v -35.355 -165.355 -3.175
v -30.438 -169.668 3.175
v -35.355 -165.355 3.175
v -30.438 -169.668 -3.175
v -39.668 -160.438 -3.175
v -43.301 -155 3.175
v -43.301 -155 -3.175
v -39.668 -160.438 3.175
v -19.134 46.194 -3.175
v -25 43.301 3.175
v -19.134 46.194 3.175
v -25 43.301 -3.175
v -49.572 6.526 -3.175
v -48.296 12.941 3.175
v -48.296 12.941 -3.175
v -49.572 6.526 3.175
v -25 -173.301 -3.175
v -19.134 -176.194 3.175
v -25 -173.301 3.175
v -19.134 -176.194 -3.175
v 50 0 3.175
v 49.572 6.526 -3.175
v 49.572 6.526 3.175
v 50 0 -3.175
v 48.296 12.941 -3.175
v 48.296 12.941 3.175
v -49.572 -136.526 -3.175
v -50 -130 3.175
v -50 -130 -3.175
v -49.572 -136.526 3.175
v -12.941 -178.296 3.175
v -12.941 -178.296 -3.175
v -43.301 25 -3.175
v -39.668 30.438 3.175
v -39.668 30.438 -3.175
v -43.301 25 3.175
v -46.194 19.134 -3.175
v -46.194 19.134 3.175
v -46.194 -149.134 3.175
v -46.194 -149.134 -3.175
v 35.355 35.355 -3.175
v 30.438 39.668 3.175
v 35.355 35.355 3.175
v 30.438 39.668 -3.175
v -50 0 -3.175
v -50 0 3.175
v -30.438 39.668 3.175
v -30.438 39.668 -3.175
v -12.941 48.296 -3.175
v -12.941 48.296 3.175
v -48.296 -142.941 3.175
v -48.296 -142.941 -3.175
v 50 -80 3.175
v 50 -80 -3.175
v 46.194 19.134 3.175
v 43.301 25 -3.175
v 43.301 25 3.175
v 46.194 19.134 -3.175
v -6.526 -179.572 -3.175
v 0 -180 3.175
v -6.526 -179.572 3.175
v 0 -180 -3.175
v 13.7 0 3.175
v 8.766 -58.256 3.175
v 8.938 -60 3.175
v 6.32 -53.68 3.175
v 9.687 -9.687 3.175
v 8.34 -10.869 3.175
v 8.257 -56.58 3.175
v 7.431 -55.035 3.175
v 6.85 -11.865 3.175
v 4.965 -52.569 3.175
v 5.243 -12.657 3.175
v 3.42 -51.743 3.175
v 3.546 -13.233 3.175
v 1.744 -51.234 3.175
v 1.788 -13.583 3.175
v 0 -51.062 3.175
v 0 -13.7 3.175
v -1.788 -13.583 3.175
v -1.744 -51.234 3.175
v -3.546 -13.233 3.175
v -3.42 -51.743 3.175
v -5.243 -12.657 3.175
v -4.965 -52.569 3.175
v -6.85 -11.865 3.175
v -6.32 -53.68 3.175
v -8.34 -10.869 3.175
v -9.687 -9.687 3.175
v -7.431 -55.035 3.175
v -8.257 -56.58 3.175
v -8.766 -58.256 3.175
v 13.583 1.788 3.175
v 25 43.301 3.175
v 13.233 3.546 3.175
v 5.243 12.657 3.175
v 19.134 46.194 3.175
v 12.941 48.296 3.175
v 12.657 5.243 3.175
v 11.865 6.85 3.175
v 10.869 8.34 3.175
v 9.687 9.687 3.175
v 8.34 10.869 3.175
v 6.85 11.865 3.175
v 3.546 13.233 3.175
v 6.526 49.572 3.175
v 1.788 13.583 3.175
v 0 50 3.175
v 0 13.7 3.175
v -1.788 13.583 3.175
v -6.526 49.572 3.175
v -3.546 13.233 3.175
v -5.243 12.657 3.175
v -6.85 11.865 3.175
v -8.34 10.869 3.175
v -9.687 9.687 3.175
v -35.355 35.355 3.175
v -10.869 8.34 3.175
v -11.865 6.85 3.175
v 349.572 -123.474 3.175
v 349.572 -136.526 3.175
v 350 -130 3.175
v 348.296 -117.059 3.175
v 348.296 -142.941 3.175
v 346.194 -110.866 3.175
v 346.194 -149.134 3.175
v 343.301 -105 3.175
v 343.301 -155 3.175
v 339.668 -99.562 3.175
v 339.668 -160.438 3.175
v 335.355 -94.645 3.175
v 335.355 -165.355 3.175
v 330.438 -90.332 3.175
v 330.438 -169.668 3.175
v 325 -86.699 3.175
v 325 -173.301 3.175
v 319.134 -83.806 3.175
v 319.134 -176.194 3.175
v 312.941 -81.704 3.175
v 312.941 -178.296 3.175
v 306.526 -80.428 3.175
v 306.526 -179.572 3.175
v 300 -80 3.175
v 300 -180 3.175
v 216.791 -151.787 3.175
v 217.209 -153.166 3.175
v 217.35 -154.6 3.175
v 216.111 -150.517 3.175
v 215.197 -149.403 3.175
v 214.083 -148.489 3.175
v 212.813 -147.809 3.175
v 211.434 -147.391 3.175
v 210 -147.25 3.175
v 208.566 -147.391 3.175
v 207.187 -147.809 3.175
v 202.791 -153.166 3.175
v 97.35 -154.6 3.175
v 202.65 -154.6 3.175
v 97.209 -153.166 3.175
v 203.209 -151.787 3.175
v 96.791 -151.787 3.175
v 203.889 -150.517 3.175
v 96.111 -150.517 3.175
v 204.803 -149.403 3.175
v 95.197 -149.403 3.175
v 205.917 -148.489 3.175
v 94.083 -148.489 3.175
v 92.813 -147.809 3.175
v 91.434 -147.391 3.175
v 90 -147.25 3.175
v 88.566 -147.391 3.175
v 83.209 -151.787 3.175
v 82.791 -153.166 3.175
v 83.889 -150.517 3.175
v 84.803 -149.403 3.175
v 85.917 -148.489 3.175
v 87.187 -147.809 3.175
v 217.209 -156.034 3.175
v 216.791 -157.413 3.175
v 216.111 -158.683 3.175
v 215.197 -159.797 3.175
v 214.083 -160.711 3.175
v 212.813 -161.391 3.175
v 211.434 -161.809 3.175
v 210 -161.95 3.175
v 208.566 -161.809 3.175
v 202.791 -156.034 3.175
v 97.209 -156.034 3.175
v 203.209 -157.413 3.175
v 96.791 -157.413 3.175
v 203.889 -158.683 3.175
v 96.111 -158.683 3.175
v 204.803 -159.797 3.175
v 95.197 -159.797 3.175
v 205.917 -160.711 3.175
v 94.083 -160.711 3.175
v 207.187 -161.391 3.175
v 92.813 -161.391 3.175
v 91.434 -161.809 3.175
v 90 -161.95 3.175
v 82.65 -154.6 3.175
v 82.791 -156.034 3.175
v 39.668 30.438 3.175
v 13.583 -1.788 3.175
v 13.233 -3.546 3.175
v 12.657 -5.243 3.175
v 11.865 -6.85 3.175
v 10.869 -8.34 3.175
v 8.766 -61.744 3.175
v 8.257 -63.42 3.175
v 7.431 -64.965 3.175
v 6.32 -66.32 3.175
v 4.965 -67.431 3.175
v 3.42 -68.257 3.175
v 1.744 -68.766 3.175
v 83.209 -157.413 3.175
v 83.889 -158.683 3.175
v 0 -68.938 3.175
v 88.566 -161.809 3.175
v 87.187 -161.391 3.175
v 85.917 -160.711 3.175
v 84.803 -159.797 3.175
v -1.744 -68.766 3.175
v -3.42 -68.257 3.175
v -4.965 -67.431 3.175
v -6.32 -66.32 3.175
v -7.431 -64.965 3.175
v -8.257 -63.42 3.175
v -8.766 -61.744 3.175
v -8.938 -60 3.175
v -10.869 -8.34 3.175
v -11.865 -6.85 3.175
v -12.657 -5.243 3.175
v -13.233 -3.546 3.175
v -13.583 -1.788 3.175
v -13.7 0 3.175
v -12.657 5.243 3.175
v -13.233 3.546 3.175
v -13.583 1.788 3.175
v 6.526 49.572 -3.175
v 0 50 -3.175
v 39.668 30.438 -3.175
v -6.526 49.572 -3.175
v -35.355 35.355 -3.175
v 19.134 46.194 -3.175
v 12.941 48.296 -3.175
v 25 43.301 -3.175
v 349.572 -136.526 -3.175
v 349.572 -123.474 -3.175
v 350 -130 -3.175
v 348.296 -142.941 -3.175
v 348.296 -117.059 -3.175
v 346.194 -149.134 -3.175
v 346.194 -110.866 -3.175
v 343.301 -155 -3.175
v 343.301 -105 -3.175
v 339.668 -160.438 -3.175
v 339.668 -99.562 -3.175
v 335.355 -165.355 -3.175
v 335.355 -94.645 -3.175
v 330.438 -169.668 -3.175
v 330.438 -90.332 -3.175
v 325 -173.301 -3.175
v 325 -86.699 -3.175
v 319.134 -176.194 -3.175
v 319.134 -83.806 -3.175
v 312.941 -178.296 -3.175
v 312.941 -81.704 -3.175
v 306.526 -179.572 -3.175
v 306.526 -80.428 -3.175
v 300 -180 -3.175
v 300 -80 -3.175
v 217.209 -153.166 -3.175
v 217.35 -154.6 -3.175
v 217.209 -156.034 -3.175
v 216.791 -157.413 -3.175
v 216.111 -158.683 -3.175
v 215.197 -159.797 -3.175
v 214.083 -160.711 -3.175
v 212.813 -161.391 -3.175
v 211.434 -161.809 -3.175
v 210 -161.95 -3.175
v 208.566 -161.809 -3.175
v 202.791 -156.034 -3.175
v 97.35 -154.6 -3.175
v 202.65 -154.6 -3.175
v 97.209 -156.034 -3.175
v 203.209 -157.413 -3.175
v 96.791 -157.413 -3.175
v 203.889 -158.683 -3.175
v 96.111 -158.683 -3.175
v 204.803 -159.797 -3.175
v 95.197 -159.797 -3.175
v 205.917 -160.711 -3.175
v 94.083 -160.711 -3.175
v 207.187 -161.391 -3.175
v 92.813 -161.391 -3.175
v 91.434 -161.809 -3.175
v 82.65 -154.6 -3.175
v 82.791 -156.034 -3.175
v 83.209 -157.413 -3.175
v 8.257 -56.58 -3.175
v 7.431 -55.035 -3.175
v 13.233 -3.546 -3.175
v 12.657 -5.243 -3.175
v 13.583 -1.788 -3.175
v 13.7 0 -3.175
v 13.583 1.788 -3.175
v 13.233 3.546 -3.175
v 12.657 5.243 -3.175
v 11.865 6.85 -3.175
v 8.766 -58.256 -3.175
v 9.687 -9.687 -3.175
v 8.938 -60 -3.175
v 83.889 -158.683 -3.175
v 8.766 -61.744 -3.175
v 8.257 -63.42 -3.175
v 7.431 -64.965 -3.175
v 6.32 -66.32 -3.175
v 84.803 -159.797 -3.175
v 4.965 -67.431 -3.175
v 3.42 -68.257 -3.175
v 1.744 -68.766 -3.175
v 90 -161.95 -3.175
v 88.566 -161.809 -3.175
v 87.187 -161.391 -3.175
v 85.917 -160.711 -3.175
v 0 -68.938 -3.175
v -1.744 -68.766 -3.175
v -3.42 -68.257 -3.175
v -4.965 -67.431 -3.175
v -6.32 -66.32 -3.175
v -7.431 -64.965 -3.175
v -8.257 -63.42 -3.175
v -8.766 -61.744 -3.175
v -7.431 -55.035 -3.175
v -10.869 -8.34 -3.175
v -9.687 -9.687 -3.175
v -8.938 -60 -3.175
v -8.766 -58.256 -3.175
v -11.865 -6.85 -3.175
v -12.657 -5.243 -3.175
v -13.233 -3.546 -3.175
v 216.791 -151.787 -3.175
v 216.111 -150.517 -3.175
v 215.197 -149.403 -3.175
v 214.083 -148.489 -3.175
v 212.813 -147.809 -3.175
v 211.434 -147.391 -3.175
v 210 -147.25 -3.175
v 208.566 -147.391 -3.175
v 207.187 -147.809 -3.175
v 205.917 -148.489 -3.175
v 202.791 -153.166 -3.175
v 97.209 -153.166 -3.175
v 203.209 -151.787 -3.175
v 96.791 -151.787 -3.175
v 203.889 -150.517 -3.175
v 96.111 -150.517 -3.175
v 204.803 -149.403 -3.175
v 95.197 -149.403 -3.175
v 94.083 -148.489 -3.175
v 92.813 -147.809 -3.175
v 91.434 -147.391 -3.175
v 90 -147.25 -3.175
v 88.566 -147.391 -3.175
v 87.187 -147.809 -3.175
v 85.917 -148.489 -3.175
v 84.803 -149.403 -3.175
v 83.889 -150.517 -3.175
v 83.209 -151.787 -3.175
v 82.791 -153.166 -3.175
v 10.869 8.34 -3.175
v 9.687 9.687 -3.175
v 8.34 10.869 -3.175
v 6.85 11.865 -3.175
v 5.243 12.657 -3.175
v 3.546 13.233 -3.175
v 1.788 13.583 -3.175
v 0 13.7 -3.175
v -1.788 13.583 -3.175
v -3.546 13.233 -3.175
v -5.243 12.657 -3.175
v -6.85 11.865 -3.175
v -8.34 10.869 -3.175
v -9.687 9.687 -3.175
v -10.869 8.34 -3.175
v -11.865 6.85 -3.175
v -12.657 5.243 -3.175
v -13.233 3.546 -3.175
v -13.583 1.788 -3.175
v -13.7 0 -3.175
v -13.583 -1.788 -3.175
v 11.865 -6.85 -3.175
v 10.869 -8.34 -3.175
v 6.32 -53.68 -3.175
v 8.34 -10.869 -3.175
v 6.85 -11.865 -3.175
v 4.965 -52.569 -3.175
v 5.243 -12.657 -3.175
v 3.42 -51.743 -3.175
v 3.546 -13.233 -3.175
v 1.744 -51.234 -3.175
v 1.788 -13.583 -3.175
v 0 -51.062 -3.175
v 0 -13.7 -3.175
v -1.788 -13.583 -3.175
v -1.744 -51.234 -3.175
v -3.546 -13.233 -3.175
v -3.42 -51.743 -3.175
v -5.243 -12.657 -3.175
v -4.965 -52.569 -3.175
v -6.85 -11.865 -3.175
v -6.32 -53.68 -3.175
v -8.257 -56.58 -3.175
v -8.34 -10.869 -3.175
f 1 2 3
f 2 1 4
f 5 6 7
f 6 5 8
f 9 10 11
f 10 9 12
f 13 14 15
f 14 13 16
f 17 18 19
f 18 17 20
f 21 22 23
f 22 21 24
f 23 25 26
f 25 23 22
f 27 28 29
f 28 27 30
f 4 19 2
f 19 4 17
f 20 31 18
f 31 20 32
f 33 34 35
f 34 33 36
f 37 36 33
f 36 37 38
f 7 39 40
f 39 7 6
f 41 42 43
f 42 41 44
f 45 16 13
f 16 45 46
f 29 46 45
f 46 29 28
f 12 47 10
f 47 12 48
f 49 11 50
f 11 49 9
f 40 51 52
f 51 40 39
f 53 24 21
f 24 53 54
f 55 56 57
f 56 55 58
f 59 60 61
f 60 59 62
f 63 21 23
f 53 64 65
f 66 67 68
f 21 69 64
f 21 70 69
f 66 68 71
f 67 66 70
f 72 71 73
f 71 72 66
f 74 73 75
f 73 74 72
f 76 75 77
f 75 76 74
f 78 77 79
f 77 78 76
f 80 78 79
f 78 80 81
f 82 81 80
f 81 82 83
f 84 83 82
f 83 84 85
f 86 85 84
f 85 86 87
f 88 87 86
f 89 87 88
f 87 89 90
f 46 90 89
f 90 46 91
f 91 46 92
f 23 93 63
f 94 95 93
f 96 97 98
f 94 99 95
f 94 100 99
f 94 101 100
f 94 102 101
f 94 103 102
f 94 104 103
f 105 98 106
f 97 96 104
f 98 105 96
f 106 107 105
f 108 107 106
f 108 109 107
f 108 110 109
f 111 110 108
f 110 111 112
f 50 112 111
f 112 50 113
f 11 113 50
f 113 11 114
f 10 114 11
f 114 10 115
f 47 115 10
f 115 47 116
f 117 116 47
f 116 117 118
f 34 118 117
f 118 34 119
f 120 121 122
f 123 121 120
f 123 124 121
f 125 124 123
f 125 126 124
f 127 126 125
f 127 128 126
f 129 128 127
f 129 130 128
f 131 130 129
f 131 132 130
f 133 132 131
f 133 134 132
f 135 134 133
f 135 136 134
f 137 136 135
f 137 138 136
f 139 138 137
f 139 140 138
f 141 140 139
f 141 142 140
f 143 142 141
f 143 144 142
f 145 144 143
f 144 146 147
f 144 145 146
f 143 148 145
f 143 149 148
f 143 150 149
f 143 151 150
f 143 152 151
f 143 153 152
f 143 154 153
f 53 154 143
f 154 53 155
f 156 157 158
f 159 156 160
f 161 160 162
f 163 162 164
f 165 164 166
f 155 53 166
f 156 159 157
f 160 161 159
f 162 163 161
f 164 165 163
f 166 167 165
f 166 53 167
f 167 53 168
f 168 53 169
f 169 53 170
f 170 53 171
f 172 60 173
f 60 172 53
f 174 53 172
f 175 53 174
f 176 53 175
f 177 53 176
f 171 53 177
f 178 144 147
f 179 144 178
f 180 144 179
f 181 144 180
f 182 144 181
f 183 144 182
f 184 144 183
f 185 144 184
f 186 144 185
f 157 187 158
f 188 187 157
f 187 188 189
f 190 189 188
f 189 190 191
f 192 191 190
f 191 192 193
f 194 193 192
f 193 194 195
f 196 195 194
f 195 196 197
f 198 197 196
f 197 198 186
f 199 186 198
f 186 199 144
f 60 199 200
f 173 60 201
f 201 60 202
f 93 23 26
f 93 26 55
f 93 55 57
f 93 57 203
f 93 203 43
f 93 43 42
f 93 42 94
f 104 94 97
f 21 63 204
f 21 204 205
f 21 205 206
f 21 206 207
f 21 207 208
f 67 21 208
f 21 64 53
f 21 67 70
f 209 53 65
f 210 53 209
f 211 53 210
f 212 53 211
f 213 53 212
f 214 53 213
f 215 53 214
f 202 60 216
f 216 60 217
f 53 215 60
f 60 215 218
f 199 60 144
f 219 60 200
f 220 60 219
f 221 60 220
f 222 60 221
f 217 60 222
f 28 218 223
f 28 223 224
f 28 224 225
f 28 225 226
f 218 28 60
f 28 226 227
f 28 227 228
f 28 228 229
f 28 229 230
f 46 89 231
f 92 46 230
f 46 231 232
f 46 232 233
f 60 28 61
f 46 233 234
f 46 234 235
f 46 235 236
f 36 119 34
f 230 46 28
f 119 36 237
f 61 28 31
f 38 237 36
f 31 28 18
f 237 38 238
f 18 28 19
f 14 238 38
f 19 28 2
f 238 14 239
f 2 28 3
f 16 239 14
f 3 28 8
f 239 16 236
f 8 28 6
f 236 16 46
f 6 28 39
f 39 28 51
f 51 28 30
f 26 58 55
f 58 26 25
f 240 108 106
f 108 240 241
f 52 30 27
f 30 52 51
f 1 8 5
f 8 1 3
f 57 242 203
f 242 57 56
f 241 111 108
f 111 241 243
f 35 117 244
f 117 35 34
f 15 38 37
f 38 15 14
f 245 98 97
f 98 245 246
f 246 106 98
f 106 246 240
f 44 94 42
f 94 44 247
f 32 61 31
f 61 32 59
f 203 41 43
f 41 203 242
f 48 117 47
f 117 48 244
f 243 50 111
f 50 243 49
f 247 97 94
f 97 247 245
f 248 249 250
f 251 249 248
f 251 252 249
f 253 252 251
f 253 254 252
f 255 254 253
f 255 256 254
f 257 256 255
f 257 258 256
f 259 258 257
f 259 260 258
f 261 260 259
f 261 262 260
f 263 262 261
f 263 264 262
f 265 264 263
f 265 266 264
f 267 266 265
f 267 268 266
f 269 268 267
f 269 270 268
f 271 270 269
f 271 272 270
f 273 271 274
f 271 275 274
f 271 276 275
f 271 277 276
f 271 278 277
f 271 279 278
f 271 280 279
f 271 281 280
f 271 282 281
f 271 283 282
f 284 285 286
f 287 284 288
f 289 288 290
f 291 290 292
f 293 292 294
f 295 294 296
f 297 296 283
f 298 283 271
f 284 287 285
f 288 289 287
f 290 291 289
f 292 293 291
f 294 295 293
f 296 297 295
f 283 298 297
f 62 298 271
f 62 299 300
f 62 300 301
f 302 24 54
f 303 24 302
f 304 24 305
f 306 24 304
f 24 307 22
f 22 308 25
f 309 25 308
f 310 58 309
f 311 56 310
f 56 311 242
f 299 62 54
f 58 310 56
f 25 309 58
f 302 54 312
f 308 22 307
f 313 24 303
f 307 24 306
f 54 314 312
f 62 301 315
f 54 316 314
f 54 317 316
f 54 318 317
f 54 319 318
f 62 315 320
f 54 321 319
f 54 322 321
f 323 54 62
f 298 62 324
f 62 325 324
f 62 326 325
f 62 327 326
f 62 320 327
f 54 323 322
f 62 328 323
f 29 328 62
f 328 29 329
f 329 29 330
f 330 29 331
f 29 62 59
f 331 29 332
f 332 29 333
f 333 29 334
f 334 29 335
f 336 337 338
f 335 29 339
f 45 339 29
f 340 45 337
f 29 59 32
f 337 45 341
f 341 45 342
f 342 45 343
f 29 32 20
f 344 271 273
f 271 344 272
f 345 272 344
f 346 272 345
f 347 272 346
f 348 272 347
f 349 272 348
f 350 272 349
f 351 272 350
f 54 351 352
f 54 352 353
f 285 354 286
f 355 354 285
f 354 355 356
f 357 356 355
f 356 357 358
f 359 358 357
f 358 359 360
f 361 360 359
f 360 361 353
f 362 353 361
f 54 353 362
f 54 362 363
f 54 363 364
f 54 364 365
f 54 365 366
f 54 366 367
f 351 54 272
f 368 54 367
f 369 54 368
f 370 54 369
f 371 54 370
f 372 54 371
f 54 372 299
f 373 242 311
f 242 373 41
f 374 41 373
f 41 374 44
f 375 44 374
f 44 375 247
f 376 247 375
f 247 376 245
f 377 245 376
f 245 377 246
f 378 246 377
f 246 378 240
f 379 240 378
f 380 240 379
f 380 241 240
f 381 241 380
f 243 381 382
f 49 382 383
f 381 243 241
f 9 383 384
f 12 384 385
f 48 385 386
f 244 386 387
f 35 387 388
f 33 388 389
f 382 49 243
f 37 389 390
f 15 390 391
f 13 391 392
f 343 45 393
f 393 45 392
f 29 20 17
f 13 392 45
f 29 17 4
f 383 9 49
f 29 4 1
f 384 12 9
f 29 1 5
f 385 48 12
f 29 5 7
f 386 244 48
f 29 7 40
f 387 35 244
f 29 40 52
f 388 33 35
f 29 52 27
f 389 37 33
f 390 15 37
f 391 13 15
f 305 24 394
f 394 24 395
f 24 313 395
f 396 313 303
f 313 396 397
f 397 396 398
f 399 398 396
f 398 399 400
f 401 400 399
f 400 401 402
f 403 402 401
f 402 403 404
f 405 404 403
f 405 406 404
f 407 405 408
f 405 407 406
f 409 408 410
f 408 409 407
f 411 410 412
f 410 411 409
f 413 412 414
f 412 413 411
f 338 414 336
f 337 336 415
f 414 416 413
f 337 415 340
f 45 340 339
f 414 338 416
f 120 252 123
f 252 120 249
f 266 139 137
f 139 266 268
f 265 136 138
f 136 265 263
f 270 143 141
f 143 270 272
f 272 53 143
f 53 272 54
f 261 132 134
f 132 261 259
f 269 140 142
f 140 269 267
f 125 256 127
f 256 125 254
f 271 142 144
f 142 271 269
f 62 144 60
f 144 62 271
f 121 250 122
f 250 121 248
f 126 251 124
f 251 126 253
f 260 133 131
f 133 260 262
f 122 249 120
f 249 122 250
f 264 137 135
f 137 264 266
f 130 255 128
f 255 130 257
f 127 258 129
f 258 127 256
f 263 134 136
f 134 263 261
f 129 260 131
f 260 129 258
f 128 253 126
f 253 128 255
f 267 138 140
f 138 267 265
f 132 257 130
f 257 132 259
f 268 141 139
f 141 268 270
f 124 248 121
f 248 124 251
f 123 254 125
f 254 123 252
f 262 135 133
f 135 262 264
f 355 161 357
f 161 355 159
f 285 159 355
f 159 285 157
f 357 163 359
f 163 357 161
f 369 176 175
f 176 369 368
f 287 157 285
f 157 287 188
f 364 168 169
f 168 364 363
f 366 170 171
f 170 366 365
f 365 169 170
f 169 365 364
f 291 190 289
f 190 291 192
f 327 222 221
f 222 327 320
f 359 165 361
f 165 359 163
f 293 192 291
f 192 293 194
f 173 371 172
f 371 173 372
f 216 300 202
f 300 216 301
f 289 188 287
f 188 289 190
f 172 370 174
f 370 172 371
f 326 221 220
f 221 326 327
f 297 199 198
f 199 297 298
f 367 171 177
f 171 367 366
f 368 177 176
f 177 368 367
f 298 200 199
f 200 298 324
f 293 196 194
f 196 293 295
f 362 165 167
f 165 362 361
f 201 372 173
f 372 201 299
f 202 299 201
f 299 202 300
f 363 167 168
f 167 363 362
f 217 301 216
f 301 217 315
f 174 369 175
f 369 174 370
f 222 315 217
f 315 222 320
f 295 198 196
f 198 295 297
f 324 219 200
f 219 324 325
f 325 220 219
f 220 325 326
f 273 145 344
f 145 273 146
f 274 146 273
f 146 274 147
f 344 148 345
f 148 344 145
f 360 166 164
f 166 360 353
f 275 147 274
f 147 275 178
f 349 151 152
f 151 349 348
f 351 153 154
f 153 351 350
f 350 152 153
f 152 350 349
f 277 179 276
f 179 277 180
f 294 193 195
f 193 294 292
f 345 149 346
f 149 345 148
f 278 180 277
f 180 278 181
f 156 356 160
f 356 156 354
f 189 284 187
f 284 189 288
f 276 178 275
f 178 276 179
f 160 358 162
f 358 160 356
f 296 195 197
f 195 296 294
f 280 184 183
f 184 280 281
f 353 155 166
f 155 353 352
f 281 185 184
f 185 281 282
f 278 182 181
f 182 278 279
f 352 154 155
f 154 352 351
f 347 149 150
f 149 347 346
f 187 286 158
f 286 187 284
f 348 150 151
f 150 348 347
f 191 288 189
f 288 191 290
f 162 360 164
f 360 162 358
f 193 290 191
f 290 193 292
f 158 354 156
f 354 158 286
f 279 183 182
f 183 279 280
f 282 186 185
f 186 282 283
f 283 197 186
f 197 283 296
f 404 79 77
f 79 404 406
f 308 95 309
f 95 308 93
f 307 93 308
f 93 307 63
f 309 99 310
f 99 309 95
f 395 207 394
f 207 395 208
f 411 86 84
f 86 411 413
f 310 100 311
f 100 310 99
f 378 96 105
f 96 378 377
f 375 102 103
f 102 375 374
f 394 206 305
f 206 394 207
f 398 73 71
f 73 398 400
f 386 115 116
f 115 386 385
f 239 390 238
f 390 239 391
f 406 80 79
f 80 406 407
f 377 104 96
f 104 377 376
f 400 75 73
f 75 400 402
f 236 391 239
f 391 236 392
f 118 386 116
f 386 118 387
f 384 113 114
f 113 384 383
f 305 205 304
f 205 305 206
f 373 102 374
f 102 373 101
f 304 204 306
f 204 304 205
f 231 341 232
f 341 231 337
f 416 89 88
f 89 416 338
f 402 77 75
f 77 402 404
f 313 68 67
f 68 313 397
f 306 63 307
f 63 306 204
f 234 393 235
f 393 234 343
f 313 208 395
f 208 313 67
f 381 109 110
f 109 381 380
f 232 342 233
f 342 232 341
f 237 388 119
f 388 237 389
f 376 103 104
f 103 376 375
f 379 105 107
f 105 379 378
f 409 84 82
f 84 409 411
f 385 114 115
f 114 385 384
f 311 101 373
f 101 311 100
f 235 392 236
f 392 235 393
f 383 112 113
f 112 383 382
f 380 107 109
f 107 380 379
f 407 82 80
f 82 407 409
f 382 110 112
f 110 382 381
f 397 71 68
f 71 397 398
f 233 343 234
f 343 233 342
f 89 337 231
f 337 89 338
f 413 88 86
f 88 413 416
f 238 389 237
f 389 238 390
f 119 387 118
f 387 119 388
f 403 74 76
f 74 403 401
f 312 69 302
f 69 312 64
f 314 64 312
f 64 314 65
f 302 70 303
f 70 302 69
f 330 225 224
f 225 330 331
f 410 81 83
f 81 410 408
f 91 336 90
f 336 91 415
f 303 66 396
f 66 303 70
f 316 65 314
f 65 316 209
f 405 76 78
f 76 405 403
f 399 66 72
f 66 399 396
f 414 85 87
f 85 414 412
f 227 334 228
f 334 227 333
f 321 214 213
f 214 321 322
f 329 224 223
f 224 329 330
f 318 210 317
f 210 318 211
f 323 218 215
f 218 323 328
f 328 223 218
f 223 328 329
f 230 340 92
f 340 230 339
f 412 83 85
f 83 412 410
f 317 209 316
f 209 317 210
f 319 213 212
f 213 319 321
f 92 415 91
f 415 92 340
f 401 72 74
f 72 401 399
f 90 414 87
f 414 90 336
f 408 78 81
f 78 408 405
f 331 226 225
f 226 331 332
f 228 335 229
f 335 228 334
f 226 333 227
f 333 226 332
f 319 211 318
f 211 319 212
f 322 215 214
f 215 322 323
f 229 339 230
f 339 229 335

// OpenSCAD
// platform_pivot_bracket.scad
// Pivot bracket plate for LifeTrac v25 folding platform
// CNC cut from 1/4" plate
// Part of the 5-component folding platform system
//
// This bracket connects the angle iron arm to the machine frame:
//   - One end has bolt holes for angle iron attachment
//   - Other end has a 1" pivot hole and lock pin hole
//
// Two brackets required (left and right side)

include <../lifetrac_v25_params.scad>

/**
 * Creates the pivot bracket plate with pivot hole, lock hole, and bolt holes
 * All dimensions are parametric from lifetrac_v25_params.scad
 * 
 * Coordinate system when rendered:
 *   - Centered at origin in X and Y
 *   - Thickness in Z direction
 *   - Lock hole at Origin [0,0]
 *   - Pivot hole at [0, PLATFORM_LOCK_OFFSET]
 *   - Bolt holes at +X
 *   - Designed to be oriented vertically when installed
 */
module platform_pivot_bracket() {
    echo(BOM_PART = "P16");  // counted by drawings/generate_part_drawings.py
    // Local variables
    thickness = PLATFORM_THICKNESS;
    width = PLATFORM_BRACKET_WIDTH;
    
    // Dimensions relative to Pivot Hole at (0,0)
    pivot_y = 0;
    lock_y = -PLATFORM_LOCK_OFFSET; // -60mm
    corner_y = lock_y + PLATFORM_SIDE_BOLT_Y_OFFSET; // -130mm
    
    // Corner radius - using width/2 to maintain constant width and avoid pinching
    corner_radius = width / 2; 
    
    // Bolt positions
    // Moved to Leg 2 (Horizontal in File X, Vertical in Assembly Z)
    // This places bolts on the "bottom" leg relative to the L-shape in 2D view
    
    // Y position is constant (centered on Leg 2)
    // Leg 2 is centered at corner_y. Width is width.
    // We want bolts in the "bottom half" of the leg width.
    // Bottom edge is corner_y - width/2.
    // Bolt Y = Bottom Edge + LEG/2.
    bolt_y = corner_y - width/2 + PLATFORM_ANGLE_LEG/2;
    
    // X positions (distributed along Leg 2)
    // Leg 2 extends from X=0 to X=PLATFORM_BRACKET_LENGTH - width/2
    // We place bolts at pivot_bolt_offset from each end of this span
    leg2_length = PLATFORM_BRACKET_LENGTH - width/2;
    bolt_x_1 = pivot_bolt_offset;
    bolt_x_2 = leg2_length - pivot_bolt_offset;
    
    // Hole diameters
    pivot_hole_dia = PLATFORM_PIVOT_PIN_DIA + PLATFORM_BOLT_CLEARANCE;
    bolt_hole_dia = PLATFORM_BOLT_DIA + PLATFORM_BOLT_CLEARANCE;
    lock_hole_dia = PLATFORM_LOCK_PIN_DIA + PLATFORM_BOLT_CLEARANCE;
    
    difference() {
        union() {
            // Vertical Leg (Pivot to Corner) - Along Y
            hull() {
                // Pivot position
                translate([0, pivot_y, 0])
                cylinder(d=width, h=thickness, center=true, $fn=48);
                
                // Corner position
                translate([0, corner_y, 0])
                cylinder(r=corner_radius, h=thickness, center=true, $fn=48);
            }
            
            // Horizontal Leg (Corner to End) - Along X
            hull() {
                // Corner position
                translate([0, corner_y, 0])
                cylinder(r=corner_radius, h=thickness, center=true, $fn=48);
                
                // Extended to reach back of platform deck (PLATFORM_BRACKET_LENGTH)
                translate([PLATFORM_BRACKET_LENGTH - width/2, corner_y, 0]) 
                cylinder(d=width, h=thickness, center=true, $fn=48);
            }
        }
        
        // Pivot hole at [0, 0]
        translate([0, pivot_y, 0])
        cylinder(d=pivot_hole_dia, h=thickness + 4, center=true, $fn=48);
        
        // Lock pin hole at [0, -60]
        translate([0, lock_y, 0])
        cylinder(d=lock_hole_dia, h=thickness + 4, center=true, $fn=32);
        
        // Bolt holes
        // Positioned along Leg 2 (X axis)
        for (bx = [bolt_x_1, bolt_x_2]) {
            translate([bx, bolt_y, 0])
            cylinder(d=bolt_hole_dia, h=thickness + 4, center=true, $fn=32);
        }
    }
}

// Render the part for preview/export
if ($preview || len(search("platform_pivot_bracket.scad", parent_modules())) == 0) {
    platform_pivot_bracket();
}
